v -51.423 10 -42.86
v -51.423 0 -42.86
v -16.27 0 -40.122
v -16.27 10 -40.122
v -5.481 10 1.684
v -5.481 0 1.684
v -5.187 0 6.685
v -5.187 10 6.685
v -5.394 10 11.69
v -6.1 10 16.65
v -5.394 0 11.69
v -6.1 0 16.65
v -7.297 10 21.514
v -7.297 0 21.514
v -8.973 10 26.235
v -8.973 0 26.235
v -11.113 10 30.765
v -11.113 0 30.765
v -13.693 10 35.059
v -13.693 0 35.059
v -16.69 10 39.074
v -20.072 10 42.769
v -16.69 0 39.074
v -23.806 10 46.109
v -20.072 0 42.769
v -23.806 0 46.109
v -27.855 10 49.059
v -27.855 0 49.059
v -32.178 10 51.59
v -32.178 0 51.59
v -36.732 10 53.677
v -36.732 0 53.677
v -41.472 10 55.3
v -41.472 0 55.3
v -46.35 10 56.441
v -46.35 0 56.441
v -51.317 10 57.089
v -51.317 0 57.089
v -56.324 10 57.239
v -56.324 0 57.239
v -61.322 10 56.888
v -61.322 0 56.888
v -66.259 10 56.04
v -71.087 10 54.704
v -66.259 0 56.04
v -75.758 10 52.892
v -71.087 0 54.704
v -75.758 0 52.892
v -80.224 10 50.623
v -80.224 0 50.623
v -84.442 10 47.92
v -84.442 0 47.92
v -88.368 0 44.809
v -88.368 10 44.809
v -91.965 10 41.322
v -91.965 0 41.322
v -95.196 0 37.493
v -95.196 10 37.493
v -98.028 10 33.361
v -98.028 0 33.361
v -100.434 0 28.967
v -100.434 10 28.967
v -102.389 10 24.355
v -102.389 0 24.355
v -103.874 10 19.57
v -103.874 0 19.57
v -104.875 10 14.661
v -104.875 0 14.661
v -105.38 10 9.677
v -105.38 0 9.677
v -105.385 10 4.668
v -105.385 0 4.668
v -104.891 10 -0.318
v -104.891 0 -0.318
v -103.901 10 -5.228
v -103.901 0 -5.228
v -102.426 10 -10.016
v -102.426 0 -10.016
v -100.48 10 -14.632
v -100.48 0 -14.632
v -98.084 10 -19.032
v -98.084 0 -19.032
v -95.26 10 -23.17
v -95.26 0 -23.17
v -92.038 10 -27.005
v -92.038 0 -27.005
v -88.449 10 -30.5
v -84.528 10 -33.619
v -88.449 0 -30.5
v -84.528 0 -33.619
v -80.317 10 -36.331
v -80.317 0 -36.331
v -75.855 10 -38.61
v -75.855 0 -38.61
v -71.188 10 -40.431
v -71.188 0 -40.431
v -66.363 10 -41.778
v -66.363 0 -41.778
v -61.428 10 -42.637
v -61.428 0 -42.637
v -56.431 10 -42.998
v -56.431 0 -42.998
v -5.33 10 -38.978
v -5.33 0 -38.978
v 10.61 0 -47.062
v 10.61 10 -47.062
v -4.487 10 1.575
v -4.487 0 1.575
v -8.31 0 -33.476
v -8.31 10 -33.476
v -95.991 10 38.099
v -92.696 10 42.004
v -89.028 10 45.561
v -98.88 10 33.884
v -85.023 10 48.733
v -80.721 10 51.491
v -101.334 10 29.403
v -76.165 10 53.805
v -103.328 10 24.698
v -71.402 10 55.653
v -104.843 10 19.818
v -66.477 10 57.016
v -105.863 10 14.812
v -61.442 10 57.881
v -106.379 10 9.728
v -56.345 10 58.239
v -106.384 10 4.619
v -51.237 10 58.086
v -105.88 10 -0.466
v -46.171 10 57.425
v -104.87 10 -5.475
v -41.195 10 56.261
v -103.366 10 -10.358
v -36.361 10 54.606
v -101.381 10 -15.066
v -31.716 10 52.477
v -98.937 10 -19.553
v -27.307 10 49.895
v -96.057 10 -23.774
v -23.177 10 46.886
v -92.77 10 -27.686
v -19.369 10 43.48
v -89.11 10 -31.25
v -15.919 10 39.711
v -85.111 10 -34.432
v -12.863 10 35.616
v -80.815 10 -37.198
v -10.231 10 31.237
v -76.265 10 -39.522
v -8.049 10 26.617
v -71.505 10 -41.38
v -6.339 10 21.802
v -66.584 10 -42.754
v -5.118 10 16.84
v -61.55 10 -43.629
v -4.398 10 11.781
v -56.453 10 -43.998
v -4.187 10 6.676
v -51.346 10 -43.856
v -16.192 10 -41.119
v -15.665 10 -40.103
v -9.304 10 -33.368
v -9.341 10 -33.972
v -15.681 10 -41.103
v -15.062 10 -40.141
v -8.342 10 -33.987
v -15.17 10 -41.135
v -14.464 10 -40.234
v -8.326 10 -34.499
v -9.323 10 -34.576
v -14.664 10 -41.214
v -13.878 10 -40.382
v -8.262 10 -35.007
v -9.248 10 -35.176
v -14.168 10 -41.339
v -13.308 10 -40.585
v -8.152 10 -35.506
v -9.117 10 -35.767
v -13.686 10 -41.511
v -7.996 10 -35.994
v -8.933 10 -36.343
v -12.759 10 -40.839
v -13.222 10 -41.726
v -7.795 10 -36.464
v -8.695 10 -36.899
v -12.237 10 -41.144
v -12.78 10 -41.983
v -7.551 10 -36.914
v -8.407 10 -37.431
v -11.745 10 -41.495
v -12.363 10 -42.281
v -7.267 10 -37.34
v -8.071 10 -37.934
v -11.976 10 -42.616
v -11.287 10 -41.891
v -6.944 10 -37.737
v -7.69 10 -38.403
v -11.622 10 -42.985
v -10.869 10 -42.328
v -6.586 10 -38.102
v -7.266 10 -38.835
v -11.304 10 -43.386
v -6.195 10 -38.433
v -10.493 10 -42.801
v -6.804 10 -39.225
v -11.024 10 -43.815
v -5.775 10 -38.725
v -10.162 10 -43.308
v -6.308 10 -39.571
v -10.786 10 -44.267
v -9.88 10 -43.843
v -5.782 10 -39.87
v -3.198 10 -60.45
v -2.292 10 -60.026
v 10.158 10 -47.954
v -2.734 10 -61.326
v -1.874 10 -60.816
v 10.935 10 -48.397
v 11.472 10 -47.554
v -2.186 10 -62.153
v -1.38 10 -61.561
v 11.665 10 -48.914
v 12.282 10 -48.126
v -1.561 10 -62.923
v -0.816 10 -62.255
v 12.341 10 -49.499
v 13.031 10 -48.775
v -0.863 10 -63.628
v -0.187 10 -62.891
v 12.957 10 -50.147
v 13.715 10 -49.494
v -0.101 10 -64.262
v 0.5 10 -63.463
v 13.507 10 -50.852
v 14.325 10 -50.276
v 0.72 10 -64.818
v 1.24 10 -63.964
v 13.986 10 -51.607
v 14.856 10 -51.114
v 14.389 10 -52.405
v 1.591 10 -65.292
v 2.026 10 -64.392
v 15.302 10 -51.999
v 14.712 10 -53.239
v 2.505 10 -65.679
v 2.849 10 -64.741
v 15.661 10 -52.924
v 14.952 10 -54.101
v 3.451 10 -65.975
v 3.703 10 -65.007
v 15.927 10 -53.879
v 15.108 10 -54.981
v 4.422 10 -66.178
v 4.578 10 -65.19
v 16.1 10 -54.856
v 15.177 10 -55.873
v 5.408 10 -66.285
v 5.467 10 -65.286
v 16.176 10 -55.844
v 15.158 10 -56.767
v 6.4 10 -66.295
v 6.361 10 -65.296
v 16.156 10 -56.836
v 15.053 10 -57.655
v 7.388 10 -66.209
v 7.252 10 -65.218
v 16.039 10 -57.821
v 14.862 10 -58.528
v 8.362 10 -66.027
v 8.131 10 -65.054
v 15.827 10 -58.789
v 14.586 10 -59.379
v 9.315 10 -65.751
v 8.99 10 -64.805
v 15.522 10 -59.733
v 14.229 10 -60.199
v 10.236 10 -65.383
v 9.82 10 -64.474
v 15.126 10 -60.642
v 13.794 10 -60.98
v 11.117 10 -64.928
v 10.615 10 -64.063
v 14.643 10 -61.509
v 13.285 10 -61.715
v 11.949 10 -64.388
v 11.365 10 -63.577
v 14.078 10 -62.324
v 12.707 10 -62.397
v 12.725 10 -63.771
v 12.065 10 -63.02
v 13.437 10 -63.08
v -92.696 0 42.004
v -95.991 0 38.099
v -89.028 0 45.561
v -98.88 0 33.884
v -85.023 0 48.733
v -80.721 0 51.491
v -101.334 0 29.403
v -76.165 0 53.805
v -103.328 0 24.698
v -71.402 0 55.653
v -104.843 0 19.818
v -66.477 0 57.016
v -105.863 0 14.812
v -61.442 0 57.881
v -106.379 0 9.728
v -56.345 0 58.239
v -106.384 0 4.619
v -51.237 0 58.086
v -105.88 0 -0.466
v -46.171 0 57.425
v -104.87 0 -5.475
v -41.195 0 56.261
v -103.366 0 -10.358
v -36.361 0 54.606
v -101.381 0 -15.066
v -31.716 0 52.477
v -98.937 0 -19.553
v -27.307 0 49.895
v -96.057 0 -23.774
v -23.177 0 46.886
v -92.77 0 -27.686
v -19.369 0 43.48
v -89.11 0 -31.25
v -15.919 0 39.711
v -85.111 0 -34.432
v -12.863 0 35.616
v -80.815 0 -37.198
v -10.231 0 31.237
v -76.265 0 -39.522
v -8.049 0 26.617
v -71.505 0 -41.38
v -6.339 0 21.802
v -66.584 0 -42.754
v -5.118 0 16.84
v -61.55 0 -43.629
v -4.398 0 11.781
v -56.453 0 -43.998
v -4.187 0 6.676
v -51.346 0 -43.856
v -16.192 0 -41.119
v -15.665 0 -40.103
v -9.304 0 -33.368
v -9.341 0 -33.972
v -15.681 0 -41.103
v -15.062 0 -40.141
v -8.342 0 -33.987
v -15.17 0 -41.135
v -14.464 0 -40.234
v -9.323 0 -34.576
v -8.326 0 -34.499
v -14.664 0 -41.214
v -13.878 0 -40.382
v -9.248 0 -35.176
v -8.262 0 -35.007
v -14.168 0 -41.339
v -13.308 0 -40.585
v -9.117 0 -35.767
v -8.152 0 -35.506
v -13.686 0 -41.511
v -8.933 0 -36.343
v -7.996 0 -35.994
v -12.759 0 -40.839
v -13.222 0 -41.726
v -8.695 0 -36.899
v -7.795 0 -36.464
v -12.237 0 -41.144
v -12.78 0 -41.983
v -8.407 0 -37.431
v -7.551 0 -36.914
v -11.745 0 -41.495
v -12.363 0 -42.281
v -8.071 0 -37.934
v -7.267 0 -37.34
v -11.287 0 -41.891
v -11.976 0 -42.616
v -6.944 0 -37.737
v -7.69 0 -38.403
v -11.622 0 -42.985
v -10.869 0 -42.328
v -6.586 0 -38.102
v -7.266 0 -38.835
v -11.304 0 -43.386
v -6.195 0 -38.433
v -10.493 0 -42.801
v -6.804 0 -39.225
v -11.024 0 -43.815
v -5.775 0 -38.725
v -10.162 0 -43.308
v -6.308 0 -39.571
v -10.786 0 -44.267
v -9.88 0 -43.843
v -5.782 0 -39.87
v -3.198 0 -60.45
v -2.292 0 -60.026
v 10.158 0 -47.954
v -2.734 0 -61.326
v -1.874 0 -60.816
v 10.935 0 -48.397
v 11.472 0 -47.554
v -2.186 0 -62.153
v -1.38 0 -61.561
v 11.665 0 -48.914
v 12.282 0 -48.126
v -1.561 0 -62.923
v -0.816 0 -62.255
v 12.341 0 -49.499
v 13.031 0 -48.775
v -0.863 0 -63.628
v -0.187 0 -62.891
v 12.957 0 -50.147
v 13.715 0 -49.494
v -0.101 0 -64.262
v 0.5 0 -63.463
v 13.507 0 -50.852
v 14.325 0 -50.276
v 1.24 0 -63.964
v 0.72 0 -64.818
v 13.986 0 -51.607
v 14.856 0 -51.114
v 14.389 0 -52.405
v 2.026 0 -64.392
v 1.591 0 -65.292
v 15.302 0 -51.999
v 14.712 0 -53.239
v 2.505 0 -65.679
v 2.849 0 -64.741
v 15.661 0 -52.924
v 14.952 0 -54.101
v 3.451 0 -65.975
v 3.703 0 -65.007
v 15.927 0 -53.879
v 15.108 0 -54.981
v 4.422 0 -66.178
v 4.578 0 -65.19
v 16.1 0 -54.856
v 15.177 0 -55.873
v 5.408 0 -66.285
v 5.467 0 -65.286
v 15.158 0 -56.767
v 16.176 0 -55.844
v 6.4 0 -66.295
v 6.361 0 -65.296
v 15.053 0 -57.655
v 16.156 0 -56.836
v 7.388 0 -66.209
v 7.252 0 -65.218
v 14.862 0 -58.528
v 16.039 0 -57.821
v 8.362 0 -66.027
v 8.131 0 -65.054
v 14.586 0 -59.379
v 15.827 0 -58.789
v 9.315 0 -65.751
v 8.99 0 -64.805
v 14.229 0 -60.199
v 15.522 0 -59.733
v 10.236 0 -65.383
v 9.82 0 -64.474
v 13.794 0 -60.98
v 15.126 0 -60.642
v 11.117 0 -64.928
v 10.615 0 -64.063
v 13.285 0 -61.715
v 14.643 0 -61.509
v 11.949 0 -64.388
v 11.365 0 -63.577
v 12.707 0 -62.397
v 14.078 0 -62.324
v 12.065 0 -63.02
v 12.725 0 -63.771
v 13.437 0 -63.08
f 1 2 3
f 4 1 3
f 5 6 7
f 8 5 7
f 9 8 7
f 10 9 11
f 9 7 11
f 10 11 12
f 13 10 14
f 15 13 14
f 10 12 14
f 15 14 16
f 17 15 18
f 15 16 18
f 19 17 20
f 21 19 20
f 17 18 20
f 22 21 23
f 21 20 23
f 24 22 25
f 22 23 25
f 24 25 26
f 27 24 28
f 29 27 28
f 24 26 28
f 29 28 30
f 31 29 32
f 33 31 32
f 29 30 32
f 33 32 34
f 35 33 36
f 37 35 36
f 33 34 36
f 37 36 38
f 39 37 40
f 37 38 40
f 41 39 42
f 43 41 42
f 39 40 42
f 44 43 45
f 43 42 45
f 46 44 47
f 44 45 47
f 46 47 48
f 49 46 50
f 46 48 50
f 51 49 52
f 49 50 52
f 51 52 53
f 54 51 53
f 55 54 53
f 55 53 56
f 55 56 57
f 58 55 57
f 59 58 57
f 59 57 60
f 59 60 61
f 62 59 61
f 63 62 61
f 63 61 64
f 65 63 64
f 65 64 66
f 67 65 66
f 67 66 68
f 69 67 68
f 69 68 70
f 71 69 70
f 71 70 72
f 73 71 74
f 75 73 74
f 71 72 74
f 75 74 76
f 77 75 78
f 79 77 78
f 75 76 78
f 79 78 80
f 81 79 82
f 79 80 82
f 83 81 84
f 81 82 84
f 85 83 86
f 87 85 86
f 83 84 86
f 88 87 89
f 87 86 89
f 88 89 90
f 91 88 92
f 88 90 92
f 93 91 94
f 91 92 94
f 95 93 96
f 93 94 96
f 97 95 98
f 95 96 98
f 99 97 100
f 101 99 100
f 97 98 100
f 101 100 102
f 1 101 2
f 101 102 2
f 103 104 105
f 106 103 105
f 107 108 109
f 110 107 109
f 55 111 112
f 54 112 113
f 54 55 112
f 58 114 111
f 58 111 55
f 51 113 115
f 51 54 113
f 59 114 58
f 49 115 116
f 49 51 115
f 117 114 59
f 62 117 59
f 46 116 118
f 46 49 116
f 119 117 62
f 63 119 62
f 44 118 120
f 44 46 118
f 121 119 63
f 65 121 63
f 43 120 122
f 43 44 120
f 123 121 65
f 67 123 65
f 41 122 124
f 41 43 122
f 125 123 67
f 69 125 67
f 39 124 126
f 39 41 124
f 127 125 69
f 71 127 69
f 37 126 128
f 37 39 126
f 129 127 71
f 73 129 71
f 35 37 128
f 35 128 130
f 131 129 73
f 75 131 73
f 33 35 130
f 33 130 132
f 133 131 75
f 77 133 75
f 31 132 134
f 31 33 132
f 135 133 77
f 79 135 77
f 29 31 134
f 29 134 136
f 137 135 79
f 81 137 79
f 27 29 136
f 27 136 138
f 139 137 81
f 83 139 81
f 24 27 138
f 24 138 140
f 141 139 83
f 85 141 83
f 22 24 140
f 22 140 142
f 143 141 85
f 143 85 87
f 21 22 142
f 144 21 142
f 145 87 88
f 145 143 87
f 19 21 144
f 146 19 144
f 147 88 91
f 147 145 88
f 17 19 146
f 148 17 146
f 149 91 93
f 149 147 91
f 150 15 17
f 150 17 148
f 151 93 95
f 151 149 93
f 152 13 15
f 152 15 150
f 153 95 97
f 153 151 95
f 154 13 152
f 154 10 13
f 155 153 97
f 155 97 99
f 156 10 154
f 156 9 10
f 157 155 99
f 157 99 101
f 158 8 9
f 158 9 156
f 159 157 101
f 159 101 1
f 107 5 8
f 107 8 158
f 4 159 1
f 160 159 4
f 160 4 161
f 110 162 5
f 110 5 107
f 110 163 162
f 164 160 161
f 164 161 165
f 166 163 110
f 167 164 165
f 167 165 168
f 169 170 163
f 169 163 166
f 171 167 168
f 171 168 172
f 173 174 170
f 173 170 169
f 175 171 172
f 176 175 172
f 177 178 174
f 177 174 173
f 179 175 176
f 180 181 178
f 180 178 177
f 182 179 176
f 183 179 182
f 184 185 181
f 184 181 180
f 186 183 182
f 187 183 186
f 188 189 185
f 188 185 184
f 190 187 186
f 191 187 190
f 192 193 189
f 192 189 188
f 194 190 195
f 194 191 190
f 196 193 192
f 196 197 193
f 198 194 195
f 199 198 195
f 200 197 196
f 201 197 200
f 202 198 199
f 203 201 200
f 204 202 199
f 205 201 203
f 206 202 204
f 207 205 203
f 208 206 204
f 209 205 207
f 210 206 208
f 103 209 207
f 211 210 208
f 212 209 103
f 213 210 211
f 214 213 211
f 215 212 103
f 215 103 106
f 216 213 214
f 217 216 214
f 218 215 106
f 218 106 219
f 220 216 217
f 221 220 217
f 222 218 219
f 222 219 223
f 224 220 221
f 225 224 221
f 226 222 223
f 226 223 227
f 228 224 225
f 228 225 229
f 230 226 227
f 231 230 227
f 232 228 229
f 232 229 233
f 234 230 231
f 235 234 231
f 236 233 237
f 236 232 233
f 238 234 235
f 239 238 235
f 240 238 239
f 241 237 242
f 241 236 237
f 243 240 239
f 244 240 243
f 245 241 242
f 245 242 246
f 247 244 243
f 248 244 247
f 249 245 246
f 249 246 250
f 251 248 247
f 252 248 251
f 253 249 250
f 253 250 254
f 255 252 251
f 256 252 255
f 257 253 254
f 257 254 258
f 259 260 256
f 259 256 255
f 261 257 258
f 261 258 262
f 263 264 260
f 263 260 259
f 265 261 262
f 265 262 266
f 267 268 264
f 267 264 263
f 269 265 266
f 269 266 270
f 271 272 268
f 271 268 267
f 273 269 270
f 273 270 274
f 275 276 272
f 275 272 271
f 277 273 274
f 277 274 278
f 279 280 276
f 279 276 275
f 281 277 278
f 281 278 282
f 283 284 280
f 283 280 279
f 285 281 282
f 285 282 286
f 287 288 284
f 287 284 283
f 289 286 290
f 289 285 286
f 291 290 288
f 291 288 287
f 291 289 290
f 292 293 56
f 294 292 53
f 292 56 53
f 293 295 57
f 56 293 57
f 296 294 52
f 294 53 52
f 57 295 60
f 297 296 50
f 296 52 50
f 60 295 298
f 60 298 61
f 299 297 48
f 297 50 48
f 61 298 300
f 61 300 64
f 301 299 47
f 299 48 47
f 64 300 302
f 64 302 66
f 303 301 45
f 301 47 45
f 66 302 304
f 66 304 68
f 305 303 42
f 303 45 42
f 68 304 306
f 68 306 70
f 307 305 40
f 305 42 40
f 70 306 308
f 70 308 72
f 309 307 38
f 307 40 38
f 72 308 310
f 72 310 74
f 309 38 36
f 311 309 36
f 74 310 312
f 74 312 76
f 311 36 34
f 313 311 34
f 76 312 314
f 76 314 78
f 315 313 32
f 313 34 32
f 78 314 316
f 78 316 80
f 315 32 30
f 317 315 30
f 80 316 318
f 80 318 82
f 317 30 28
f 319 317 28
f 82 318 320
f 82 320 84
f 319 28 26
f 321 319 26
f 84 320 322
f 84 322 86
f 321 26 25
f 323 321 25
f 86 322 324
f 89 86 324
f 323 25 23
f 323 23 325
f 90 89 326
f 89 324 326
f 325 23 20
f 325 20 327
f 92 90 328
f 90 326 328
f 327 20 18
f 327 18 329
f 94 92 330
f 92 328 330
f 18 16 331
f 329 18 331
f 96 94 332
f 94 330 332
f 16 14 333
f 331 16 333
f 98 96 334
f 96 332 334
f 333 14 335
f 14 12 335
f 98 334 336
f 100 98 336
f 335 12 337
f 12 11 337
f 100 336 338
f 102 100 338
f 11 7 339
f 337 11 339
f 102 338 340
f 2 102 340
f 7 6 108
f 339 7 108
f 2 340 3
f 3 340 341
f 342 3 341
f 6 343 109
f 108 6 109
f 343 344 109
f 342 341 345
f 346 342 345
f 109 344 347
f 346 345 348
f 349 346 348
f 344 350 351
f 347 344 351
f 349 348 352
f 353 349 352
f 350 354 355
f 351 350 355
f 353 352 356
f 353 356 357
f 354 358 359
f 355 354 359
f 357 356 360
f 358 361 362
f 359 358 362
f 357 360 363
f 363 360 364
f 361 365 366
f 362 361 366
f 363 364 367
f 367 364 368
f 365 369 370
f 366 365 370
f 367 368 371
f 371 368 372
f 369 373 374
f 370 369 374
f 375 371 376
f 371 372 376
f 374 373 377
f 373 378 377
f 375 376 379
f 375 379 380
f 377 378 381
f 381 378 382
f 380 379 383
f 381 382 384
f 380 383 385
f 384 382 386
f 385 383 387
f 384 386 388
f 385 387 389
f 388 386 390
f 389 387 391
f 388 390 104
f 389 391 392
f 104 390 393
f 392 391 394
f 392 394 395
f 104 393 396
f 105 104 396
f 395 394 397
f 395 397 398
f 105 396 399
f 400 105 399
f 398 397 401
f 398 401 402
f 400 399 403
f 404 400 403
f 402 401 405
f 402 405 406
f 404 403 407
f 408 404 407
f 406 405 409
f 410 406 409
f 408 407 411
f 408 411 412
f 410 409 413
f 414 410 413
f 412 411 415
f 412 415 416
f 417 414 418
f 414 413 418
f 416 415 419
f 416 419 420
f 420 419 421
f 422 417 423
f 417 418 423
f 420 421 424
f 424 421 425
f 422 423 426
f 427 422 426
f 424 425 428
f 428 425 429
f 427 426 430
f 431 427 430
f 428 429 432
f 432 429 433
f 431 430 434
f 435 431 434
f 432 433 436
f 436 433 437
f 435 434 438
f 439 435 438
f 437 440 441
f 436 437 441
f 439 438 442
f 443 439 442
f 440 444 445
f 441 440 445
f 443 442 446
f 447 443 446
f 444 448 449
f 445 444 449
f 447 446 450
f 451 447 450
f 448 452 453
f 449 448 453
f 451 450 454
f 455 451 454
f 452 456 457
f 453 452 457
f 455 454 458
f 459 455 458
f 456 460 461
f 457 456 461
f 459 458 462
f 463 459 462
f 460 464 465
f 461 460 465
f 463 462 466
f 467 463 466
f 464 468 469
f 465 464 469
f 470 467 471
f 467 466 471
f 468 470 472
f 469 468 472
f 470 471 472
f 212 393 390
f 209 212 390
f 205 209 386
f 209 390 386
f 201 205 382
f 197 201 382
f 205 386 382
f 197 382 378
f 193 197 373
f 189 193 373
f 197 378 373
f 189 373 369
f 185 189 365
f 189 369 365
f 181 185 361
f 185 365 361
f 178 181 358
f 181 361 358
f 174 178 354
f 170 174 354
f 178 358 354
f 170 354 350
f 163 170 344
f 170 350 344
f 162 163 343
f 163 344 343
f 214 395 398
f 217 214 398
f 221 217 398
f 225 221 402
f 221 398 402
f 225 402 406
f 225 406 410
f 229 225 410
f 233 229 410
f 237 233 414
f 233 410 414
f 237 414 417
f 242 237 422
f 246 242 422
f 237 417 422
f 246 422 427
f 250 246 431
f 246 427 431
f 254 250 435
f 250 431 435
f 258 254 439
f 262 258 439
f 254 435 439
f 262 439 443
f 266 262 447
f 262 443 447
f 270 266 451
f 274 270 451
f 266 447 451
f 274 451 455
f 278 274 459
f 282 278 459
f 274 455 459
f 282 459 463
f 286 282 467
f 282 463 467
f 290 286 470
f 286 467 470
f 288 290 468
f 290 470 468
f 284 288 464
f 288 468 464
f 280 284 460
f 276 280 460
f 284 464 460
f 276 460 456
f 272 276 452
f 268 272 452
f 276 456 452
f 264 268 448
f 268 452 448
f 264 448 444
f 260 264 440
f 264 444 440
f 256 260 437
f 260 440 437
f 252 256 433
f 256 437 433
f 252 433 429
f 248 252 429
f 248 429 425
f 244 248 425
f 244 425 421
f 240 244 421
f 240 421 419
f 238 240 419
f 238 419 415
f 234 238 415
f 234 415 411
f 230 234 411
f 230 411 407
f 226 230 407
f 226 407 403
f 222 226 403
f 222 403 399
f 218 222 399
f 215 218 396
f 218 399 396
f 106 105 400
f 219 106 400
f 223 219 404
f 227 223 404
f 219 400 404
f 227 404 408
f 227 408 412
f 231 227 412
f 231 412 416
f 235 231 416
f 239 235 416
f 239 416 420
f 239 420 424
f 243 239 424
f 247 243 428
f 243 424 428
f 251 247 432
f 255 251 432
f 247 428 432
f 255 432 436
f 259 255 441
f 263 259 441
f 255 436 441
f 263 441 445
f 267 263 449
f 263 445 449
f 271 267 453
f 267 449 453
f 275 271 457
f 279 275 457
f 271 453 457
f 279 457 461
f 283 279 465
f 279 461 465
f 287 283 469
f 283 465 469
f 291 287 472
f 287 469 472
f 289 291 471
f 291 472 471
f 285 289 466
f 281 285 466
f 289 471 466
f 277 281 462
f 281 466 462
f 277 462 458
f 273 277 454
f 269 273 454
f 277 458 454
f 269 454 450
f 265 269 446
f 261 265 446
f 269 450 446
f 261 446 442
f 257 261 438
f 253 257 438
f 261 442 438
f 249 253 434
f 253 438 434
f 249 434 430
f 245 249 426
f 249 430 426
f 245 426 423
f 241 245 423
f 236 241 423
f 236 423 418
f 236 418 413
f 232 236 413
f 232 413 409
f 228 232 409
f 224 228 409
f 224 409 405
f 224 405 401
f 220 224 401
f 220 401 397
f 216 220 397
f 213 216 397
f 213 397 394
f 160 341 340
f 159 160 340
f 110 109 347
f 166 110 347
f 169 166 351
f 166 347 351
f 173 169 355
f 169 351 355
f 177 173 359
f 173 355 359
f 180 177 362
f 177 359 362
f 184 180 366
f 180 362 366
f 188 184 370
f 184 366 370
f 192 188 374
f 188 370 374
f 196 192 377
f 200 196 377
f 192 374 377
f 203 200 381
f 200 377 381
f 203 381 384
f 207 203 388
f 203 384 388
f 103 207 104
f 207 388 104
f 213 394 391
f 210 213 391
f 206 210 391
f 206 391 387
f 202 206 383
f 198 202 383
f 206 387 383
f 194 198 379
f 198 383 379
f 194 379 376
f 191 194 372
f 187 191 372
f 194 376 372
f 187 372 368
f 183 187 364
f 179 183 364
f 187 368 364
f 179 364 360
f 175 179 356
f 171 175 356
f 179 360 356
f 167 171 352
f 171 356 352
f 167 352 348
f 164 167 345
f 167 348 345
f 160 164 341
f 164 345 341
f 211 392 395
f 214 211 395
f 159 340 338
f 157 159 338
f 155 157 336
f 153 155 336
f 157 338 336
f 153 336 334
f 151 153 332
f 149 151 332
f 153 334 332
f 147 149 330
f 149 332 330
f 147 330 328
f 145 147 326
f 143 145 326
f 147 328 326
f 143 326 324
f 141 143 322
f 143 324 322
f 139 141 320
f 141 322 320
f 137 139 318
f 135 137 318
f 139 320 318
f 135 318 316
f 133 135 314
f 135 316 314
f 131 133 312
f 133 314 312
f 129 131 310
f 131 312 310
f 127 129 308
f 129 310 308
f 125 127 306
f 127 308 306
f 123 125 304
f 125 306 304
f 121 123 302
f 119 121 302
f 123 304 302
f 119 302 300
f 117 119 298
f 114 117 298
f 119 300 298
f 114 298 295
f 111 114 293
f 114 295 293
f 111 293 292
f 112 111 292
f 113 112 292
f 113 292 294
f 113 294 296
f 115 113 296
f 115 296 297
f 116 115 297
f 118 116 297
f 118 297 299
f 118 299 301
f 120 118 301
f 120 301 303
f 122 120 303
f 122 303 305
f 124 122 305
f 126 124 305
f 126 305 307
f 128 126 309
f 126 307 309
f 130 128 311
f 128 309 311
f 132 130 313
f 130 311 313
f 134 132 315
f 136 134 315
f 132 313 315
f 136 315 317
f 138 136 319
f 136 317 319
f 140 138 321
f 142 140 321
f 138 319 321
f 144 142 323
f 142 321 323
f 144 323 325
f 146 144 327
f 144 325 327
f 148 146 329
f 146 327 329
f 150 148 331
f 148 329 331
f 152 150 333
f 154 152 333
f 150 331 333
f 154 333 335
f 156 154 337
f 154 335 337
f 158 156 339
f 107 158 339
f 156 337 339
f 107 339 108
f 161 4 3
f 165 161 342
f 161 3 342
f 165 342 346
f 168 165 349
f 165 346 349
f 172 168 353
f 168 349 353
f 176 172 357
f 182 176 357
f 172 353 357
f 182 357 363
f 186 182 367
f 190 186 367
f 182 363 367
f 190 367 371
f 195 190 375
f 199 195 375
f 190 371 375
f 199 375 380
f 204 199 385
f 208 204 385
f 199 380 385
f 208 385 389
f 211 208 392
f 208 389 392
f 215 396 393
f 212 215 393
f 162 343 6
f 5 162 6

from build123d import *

# Parameters (mm, degrees)
BOSS_EXTRUDE1_DEPTH = 10


with BuildPart() as part:
    # Sketch1 → Boss-Extrude1 (new body)
    with BuildSketch(Plane(origin=(0, 0, 0), x_dir=(1, 0, 0), z_dir=(0, 1, 0))):
        with BuildLine():
            Line((-3.197802304, 60.450073138), (-10.78557004, 44.267462694))
            ThreePointArc((-10.78557004, 44.267462694), (-12.997646781, 41.849514237), (-16.192346026, 41.118997306))
            Line((-16.192346026, 41.118997306), (-51.345713088, 43.856493285))
            ThreePointArc((-51.345713088, 43.856493285), (-90.906449046, -43.828164288), (-4.486759028, -1.575493597))
            Line((-4.486759028, -1.575493597), (-8.309742442, 33.476437845))
            ThreePointArc((-8.309742442, 33.476437845), (-7.678341525, 36.692194542), (-5.329937086, 38.977966806))
            Line((-5.329937086, 38.977966806), (10.610355689, 47.062406568))
            ThreePointArc((10.610355689, 47.062406568), (13.089481768, 63.434160758), (-3.197802304, 60.450073138))
        make_face()
        with BuildLine():
            ThreePointArc((-5.480863845, -1.683916901), (-90.210358478, -43.110210305), (-51.423350976, 42.859511662))
            Line((-51.423350976, 42.859511662), (-16.269983915, 40.122015682))
            ThreePointArc((-16.269983915, 40.122015682), (-12.494430262, 40.985353873), (-9.880157749, 43.842929323))
            Line((-9.880157749, 43.842929323), (-2.292390013, 60.025539767))
            ThreePointArc((-2.292390013, 60.025539767), (12.393391201, 62.716206775), (10.158033664, 47.954261256))
            Line((10.158033664, 47.954261256), (-5.782259111, 39.869821495))
            ThreePointArc((-5.782259111, 39.869821495), (-8.557646175, 37.168454274), (-9.303847259, 33.368014541))
            Line((-9.303847259, 33.368014541), (-5.480863845, -1.683916901))
        make_face(mode=Mode.SUBTRACT)
    extrude(amount=BOSS_EXTRUDE1_DEPTH)


solid = part.part
